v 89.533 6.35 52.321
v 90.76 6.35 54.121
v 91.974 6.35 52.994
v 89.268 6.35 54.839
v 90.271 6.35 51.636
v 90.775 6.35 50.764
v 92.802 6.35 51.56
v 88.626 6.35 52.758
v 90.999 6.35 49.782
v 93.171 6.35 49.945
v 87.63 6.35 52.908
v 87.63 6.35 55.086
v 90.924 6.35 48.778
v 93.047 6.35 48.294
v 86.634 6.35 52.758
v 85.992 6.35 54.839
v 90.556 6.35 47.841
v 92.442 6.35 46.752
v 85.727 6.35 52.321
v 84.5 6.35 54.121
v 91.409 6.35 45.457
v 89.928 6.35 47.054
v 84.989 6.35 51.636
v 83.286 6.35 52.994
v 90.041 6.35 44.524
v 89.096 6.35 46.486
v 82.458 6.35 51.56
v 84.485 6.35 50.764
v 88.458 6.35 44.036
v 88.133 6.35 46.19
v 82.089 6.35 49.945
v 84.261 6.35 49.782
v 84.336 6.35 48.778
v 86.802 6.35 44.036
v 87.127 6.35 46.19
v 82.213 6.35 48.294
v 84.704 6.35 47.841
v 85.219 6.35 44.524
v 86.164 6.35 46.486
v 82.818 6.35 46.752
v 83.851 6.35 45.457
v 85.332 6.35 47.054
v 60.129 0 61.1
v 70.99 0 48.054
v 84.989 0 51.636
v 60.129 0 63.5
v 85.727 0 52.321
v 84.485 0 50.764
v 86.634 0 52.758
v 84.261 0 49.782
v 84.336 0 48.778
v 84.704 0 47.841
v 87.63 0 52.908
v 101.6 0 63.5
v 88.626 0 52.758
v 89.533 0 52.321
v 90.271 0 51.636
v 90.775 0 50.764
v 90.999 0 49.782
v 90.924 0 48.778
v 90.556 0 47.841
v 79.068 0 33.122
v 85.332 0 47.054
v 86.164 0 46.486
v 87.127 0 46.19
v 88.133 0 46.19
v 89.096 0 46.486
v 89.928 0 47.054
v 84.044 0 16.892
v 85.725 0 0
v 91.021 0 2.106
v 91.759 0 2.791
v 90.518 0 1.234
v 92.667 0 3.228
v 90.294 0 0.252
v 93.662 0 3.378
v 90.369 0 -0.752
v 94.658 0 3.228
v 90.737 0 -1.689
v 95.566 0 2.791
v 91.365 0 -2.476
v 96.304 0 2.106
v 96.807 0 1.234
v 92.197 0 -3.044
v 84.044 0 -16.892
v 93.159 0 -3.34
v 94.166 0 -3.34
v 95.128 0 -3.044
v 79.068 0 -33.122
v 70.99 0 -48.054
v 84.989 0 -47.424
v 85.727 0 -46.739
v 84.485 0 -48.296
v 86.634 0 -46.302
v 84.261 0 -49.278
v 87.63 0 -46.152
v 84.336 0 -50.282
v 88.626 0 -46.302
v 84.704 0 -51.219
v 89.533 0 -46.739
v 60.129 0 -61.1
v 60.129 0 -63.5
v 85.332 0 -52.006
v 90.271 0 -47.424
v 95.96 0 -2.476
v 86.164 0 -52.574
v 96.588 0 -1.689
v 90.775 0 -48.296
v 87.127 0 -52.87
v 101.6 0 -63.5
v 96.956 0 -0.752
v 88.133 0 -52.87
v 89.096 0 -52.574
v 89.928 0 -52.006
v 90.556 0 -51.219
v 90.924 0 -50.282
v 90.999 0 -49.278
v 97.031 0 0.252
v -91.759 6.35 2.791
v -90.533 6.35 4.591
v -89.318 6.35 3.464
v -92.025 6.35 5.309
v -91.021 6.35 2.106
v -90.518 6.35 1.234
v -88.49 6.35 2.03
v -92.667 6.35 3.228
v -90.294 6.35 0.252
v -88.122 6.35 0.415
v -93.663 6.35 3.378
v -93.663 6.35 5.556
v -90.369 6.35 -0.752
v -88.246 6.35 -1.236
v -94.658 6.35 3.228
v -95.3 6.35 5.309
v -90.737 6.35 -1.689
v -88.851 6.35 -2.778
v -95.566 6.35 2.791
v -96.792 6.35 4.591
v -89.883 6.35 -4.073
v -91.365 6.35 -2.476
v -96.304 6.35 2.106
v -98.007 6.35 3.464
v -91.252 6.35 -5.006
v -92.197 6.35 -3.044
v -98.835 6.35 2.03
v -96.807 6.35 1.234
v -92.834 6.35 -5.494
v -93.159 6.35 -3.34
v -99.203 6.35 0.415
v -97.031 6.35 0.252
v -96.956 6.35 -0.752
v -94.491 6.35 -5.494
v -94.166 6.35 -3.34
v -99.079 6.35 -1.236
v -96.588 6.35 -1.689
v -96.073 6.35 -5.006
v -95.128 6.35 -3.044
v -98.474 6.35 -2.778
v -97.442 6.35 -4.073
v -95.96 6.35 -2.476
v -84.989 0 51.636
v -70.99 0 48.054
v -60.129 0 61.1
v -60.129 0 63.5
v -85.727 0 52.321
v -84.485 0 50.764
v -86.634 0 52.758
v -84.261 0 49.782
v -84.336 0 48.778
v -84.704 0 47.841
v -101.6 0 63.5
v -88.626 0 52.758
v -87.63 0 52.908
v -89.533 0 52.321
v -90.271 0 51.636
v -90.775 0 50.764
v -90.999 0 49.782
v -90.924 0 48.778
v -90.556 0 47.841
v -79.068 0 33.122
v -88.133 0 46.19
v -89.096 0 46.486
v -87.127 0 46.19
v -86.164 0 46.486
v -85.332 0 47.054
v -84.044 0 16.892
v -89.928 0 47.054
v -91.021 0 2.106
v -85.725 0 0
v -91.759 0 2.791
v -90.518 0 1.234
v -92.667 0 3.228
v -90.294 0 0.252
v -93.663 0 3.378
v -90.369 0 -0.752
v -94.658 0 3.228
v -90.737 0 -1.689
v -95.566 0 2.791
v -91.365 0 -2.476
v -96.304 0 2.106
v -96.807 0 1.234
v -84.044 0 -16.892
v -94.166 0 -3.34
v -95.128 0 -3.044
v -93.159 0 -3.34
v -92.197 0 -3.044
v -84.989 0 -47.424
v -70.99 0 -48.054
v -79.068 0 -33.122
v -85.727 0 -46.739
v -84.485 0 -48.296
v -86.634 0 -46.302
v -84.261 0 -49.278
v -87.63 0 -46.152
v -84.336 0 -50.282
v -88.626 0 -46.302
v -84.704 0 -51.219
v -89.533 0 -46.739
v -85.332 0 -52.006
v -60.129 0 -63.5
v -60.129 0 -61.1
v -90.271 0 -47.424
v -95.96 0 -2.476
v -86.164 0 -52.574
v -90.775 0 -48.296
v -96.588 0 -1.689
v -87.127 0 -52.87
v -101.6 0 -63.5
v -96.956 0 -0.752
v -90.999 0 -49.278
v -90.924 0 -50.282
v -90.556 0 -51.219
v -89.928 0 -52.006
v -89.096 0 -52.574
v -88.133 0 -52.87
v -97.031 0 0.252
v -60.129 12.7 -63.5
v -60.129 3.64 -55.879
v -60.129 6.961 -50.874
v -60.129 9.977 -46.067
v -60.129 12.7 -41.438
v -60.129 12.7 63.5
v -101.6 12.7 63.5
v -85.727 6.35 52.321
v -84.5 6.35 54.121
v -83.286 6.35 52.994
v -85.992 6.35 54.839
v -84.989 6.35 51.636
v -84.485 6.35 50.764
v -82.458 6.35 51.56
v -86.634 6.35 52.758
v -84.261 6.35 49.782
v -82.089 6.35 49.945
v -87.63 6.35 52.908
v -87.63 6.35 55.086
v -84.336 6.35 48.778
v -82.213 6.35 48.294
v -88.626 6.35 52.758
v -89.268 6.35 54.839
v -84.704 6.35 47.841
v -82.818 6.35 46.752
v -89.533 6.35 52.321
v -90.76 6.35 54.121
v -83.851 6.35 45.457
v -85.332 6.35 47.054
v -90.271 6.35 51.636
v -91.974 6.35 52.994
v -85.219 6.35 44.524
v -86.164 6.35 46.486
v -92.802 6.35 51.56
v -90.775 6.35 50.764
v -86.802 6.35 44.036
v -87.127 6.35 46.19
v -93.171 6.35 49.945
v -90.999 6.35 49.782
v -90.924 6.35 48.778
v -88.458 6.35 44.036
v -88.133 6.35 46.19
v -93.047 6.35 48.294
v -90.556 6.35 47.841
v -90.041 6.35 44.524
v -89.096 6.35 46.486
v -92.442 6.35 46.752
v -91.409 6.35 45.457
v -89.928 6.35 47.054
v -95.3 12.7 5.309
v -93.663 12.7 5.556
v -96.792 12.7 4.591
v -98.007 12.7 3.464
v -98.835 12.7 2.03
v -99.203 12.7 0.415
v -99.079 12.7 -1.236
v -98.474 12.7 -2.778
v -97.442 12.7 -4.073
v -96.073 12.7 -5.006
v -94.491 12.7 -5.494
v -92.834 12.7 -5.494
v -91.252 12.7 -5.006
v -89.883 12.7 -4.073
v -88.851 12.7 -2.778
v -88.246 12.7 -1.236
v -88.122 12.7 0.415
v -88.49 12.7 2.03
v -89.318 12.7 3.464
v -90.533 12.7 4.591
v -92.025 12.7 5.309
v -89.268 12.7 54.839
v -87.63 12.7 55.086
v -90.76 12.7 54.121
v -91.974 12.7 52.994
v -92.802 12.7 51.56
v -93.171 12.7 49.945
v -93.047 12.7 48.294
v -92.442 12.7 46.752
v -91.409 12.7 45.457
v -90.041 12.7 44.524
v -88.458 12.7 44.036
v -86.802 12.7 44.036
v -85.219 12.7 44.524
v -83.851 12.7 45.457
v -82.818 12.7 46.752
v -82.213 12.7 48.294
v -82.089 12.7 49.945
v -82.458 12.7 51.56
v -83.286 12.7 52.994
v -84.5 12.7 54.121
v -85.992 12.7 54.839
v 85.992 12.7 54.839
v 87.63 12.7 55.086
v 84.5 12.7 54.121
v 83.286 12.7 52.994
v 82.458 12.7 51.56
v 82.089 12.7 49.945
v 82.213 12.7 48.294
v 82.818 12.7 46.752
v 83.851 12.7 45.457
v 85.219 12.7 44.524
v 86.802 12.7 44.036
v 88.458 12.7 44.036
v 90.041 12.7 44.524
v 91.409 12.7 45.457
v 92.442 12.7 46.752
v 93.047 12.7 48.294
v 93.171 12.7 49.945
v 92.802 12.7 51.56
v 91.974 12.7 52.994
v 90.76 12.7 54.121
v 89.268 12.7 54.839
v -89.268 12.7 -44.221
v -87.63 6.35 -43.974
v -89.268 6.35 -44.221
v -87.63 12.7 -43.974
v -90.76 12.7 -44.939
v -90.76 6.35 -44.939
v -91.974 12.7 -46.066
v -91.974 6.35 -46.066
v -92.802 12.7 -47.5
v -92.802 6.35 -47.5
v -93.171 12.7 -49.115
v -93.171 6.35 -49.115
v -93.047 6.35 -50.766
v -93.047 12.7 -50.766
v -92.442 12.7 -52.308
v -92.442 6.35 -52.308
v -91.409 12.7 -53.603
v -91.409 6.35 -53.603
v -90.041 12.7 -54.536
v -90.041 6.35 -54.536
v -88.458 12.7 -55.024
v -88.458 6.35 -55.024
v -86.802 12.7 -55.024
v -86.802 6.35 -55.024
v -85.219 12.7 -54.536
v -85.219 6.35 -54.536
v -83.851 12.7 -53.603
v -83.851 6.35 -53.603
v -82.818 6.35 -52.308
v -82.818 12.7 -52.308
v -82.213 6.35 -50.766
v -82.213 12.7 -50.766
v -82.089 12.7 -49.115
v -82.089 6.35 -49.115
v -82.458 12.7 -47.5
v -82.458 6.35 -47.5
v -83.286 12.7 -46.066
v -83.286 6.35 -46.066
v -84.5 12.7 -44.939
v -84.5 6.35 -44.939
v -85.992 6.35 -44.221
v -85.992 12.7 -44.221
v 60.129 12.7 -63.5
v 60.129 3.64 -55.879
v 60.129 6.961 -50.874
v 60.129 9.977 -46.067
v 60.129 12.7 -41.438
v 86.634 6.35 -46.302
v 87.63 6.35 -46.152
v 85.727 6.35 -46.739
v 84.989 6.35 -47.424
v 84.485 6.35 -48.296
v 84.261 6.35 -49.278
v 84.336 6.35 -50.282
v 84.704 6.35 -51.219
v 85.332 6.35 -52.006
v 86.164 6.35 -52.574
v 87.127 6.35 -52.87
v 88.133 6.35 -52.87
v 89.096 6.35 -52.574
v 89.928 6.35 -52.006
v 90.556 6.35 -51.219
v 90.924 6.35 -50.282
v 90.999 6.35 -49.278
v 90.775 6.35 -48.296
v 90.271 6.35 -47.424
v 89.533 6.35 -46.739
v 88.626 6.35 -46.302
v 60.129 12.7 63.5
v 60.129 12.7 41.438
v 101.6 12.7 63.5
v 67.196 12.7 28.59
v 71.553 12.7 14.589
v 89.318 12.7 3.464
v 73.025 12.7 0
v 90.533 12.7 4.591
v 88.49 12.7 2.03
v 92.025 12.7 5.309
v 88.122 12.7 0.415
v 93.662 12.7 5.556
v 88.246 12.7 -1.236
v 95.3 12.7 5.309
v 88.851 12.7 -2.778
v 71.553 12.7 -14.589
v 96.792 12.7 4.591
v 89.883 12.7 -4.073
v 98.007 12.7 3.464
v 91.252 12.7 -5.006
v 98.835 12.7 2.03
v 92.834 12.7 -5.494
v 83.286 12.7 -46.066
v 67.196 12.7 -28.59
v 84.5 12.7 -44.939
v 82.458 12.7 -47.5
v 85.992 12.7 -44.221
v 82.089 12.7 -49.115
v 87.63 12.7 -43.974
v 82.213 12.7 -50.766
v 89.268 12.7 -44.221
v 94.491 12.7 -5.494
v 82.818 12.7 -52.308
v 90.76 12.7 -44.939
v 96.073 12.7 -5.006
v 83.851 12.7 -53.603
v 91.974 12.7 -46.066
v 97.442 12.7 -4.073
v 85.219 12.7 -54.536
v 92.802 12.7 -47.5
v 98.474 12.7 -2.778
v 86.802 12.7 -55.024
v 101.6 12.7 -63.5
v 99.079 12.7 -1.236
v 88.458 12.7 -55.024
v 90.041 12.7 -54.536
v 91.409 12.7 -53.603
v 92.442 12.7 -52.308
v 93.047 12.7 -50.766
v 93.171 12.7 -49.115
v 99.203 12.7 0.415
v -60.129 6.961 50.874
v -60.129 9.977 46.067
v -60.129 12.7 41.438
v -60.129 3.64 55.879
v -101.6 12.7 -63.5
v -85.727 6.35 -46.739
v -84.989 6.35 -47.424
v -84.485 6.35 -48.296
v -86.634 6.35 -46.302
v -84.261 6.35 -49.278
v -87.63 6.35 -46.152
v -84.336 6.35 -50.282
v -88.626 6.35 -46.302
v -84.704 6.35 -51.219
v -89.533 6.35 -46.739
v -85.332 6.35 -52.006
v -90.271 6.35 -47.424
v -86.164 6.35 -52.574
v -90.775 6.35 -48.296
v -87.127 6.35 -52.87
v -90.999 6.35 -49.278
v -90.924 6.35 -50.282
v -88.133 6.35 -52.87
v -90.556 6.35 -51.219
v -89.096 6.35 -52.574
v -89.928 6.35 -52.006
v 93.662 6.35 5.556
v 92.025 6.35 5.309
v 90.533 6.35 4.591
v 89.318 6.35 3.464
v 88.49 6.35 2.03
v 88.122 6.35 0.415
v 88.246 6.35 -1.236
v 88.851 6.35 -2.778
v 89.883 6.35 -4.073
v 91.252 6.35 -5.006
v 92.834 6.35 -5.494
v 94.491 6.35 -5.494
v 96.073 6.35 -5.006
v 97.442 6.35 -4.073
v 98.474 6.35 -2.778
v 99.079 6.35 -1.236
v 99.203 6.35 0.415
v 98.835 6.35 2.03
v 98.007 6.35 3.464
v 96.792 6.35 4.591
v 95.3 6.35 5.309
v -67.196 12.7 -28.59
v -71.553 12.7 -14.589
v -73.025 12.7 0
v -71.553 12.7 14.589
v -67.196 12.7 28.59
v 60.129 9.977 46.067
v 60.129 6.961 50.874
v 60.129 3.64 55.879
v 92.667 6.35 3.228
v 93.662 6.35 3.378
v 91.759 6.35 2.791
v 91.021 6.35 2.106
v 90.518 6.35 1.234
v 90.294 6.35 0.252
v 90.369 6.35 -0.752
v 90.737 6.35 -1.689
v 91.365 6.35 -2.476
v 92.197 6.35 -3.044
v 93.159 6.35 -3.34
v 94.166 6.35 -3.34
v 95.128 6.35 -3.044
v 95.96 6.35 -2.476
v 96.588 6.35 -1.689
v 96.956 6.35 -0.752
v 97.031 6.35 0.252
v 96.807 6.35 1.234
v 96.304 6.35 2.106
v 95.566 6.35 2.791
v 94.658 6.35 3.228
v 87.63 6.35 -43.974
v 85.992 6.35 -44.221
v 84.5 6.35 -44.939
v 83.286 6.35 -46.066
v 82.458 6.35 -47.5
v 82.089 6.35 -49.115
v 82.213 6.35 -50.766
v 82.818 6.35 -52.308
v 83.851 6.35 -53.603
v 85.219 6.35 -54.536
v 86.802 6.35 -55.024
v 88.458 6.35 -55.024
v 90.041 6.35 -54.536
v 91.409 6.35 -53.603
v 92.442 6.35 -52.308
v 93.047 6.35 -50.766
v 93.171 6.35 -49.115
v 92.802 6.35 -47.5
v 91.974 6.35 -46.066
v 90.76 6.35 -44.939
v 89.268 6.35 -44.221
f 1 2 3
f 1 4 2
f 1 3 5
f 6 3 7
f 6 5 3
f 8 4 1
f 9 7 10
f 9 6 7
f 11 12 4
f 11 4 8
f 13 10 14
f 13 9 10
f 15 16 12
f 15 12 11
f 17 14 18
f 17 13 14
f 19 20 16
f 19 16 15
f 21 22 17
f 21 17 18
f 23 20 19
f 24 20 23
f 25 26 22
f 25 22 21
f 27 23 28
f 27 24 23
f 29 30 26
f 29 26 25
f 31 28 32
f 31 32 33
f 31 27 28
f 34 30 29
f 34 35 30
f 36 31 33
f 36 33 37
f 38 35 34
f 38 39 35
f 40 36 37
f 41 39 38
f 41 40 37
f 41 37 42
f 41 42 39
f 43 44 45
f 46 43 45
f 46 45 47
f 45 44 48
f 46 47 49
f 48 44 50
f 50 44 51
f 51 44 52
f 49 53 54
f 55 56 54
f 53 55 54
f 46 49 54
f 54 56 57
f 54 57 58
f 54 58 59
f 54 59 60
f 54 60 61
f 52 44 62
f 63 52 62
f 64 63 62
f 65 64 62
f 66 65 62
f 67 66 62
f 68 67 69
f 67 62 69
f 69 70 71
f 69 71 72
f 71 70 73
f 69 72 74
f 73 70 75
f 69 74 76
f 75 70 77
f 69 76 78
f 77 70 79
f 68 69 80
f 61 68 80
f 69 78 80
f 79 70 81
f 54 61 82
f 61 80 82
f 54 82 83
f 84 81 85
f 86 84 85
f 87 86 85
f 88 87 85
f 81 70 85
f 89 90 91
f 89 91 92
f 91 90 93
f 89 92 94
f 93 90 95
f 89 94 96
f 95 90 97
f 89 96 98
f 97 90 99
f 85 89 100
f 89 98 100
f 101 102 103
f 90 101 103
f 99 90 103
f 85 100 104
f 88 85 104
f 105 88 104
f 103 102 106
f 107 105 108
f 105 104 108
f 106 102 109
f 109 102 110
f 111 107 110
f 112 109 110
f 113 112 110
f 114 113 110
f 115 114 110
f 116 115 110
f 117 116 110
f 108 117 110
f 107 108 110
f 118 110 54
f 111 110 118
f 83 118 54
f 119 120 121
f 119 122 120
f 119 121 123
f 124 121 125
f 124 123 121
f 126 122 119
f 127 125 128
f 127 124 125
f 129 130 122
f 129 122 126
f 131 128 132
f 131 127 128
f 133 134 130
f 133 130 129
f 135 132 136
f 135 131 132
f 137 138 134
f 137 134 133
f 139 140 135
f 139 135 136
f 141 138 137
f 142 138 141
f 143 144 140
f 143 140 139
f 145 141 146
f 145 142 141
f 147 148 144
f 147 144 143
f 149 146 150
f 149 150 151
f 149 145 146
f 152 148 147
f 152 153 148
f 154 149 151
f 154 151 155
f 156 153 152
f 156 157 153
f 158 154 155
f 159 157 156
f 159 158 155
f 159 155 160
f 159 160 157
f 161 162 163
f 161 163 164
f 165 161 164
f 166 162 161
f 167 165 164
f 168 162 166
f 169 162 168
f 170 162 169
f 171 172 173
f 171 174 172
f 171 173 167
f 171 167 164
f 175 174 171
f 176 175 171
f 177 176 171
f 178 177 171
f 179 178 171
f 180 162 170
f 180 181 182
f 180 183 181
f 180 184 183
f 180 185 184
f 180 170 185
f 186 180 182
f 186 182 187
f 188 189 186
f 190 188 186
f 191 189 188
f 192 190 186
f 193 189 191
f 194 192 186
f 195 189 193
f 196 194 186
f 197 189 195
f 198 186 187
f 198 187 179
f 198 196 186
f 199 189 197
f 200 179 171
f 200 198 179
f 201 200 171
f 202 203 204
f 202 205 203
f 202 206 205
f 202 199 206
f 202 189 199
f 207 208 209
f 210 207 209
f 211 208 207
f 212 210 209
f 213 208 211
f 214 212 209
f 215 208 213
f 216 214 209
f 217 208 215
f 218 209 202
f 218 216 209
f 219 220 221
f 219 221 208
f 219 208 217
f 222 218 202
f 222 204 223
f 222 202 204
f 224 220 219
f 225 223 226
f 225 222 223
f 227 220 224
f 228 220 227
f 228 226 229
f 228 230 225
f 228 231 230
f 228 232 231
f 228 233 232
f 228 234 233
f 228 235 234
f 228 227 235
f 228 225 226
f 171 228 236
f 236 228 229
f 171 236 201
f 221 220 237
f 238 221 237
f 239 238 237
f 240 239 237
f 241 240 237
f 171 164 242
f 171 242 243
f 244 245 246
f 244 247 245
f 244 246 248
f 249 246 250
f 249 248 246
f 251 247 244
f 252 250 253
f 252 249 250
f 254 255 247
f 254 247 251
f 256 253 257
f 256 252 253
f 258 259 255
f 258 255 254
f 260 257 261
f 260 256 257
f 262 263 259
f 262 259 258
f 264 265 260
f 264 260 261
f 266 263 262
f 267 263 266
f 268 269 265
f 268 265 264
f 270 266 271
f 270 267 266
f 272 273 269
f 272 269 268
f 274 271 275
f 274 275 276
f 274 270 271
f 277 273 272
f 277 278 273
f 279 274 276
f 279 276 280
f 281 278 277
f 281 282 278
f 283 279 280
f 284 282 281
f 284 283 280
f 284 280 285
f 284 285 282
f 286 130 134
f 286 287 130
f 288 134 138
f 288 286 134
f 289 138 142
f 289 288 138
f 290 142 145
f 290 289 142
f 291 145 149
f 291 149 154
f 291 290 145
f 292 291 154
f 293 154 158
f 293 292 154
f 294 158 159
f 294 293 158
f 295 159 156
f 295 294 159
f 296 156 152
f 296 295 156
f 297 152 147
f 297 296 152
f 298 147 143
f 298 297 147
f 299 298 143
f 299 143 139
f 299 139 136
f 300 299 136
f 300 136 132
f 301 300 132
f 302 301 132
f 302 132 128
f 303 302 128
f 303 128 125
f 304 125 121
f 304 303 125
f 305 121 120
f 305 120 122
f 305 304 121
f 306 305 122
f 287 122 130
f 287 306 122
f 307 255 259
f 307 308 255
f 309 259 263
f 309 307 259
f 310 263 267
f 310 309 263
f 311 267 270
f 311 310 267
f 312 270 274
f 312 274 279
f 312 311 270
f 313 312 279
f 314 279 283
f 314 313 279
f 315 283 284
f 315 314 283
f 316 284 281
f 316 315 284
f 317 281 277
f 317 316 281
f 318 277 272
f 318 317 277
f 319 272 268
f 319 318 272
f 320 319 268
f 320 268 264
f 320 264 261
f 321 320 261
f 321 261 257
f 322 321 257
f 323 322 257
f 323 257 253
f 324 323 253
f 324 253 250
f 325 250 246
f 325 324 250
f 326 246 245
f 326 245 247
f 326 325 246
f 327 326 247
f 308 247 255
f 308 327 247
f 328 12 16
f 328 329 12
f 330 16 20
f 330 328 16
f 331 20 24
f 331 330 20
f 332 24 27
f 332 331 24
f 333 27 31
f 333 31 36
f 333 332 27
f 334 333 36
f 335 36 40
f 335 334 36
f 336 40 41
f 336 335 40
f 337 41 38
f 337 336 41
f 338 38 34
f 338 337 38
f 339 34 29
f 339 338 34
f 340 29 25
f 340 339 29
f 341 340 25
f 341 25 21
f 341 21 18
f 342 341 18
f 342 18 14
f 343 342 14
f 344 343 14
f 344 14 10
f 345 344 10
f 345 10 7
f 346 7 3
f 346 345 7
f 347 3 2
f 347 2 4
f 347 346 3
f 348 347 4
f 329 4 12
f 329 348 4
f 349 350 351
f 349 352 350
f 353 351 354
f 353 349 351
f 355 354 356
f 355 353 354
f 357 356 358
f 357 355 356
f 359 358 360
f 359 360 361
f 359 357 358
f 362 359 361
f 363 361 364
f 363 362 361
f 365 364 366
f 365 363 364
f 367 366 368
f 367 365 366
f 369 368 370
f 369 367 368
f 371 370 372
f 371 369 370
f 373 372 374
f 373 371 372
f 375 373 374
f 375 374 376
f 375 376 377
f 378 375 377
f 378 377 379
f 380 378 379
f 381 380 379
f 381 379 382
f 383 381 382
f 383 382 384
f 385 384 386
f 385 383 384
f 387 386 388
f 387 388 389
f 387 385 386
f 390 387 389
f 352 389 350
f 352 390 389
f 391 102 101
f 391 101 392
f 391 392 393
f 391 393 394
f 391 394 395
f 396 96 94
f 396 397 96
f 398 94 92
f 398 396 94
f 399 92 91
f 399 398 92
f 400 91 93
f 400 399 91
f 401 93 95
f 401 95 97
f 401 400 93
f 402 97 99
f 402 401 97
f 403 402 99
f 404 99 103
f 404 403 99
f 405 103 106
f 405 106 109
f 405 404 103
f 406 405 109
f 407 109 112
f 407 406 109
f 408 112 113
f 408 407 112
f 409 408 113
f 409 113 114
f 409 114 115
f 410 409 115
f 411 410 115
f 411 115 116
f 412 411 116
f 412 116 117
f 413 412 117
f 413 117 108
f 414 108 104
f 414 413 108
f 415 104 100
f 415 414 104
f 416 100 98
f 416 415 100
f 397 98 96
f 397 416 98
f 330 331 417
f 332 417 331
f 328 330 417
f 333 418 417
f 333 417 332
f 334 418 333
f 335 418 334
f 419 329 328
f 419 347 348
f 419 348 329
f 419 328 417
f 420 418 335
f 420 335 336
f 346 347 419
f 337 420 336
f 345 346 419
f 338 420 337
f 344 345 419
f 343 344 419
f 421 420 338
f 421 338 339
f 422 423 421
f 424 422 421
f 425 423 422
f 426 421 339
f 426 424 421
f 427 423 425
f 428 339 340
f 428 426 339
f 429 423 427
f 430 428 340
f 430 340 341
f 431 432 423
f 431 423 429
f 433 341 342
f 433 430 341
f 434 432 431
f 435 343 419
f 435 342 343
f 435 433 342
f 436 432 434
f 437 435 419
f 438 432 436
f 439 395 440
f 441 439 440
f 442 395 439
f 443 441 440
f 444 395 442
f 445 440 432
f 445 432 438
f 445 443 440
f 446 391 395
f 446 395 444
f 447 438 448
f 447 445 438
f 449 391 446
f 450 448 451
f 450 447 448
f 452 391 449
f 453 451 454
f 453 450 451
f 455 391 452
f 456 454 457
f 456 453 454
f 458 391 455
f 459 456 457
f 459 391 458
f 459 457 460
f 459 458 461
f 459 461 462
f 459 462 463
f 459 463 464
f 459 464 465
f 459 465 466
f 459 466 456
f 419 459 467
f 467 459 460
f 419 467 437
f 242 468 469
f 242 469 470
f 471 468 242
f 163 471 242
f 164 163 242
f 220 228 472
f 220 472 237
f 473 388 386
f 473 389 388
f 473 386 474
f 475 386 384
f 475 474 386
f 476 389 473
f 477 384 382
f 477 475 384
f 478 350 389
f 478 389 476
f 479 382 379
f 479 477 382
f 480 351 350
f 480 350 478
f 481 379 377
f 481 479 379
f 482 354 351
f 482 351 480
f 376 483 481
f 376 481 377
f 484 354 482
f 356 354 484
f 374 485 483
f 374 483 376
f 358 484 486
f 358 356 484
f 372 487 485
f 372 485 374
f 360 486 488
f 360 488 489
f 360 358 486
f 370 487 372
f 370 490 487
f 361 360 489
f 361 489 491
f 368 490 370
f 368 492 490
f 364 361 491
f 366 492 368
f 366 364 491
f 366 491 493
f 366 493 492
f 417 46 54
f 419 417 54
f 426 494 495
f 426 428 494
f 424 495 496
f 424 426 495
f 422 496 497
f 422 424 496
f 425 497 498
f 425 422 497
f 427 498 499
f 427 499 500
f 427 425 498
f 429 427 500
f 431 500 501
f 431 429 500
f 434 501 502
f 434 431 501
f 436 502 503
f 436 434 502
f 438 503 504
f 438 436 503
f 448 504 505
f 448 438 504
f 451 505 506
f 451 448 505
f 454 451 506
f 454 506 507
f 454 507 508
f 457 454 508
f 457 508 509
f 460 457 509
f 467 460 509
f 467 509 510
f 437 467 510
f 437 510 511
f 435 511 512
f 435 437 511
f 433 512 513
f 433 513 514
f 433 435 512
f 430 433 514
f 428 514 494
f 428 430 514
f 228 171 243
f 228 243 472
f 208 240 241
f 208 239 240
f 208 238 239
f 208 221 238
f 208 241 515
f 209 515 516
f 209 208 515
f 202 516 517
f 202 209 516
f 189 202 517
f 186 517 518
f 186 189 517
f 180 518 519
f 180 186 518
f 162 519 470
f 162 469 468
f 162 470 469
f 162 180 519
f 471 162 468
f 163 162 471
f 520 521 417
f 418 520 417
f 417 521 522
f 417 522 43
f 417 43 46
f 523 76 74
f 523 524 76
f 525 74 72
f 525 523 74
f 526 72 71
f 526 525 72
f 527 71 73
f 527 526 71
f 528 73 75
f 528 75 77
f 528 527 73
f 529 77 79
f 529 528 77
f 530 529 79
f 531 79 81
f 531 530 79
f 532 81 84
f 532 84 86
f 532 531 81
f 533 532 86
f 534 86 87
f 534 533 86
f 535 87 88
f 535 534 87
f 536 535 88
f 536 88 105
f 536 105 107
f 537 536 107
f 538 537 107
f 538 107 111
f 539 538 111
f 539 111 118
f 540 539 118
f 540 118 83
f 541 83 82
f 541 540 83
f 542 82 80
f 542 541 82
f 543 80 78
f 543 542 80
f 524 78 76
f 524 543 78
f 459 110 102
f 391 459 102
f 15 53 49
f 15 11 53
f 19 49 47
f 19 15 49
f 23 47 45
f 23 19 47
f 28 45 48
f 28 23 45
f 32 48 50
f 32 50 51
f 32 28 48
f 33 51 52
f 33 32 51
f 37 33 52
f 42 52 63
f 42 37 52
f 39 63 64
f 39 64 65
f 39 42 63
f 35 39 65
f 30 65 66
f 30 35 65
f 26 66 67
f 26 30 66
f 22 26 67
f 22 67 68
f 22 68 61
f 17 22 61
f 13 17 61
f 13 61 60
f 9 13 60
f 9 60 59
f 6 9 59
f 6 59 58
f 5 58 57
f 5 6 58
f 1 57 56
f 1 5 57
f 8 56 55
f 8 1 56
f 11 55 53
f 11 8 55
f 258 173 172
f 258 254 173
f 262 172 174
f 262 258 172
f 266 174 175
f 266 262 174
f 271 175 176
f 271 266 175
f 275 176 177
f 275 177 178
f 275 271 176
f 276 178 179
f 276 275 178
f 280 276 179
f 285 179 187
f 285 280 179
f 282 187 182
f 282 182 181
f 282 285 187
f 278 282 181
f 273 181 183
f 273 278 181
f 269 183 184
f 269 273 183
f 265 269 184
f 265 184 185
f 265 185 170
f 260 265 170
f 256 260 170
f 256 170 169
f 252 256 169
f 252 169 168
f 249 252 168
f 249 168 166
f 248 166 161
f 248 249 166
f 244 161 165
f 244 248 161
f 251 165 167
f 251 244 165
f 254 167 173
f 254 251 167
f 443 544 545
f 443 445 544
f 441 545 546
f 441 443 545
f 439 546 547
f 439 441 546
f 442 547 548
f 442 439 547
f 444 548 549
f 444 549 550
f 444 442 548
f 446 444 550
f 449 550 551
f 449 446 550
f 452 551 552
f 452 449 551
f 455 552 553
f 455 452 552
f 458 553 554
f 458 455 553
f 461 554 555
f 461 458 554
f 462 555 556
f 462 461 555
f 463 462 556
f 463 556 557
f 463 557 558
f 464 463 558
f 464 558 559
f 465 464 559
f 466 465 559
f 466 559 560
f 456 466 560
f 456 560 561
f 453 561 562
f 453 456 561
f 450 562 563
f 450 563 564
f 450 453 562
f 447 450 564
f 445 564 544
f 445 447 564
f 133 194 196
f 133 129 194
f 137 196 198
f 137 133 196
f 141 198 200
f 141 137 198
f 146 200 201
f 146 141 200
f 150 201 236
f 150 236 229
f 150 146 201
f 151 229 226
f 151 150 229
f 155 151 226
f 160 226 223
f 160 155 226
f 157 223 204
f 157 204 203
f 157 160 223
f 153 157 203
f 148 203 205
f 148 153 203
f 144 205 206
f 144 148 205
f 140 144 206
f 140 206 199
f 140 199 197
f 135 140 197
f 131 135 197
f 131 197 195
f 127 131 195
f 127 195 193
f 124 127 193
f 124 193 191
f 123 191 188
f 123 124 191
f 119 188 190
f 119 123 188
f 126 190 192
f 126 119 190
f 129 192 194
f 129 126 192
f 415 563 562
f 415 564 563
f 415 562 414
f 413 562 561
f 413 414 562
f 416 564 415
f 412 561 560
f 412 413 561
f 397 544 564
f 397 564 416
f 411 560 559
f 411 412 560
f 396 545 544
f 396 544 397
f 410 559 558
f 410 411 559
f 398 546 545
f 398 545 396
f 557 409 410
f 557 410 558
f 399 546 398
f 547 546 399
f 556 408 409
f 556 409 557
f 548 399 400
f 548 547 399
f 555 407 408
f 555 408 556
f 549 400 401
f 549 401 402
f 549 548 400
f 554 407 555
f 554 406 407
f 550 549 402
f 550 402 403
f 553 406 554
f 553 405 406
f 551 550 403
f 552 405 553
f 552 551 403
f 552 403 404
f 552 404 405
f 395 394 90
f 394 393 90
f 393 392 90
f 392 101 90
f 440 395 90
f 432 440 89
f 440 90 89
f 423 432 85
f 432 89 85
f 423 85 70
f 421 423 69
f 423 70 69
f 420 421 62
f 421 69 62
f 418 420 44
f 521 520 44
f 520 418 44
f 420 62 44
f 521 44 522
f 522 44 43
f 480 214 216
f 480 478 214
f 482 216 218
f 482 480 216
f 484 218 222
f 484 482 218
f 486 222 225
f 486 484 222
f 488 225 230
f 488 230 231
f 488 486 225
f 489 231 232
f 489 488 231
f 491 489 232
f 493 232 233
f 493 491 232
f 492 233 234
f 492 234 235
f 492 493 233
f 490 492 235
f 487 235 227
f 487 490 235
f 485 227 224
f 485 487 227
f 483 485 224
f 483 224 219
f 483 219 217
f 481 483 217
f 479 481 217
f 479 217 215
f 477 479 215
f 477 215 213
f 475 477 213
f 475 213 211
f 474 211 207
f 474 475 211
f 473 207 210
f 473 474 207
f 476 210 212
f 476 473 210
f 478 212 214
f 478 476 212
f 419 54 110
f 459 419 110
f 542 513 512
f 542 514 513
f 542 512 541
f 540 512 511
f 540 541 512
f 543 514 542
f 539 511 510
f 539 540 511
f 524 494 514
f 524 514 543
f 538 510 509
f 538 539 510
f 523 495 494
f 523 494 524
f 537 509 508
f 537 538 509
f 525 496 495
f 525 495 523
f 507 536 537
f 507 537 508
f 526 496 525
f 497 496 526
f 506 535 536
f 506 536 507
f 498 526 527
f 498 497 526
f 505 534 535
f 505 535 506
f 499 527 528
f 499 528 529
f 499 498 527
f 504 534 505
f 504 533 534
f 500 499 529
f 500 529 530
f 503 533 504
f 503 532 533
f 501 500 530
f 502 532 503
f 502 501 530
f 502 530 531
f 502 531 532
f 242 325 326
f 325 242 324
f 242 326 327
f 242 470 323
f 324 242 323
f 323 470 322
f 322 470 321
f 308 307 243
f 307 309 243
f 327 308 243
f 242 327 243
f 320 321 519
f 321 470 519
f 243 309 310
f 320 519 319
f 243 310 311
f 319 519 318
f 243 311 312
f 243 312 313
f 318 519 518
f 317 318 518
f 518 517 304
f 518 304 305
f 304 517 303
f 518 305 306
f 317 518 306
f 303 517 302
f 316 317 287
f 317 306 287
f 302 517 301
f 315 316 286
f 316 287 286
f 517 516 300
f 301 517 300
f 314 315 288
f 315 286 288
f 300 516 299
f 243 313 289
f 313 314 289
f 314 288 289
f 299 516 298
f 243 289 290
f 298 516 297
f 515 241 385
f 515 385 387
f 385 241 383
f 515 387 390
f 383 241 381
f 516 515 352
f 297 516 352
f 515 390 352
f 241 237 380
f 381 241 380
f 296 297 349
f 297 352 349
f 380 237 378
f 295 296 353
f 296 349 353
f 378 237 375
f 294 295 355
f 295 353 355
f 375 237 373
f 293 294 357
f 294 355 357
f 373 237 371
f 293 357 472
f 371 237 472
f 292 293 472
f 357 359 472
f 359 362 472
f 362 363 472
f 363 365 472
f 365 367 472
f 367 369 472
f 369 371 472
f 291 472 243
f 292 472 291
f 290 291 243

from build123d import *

# Parameters (mm, degrees)
BOSS_EXTRUDE1_DEPTH                           = 12.7
BOSS_EXTRUDE1_2_DEPTH                         = 12.7
DRAFT1_ANGLE                                  = 45
DRAFT2_ANGLE                                  = 45
SKETCH2_W                                     = 120.258567884
SKETCH2_H                                     = 127
CUT_EXTRUDE1_DEPTH                            = 121.482778852
CBORE_FOR_1_4_SOCKET_HEAD_CAP_SCREW1_AT_COUNT = 2
CBORE_FOR_1_4_SOCKET_HEAD_CAP_SCREW1_AT_PITCH = 49.896011426
CBORE_FOR_1_4_SOCKET_HEAD_CAP_SCREW1_2_COUNT  = 2
CBORE_FOR_1_4_SOCKET_HEAD_CAP_SCREW1_2_PITCH  = 99.06
CBORE_FOR_1_4_SOCKET_HEAD_CAP_SCREW1_3_COUNT  = 2
CBORE_FOR_1_4_SOCKET_HEAD_CAP_SCREW1_3_PITCH  = 201.31803496
CBORE_FOR_1_4_SOCKET_HEAD_CAP_SCREW1_4_COUNT  = 2
CBORE_FOR_1_4_SOCKET_HEAD_CAP_SCREW1_4_PITCH  = 187.936668738
CBORE_FOR_1_4_SOCKET_HEAD_CAP_SCREW1_5_COUNT  = 2
CBORE_FOR_1_4_SOCKET_HEAD_CAP_SCREW1_5_PITCH  = 175.26


with BuildPart() as part:
    # Sketch1 → Boss-Extrude1 (new body)
    with BuildSketch(Plane(origin=(0, 0, 0), x_dir=(1, 0, 0), z_dir=(0, 1, 0))):
        with BuildLine():
            Line((-101.6, -63.5), (-101.6, 63.5))
            Line((-101.6, 63.5), (-57.589283942, 63.5))
            ThreePointArc((-57.589283942, 63.5), (-85.725, 0), (-57.589283942, -63.5))
            Line((-57.589283942, -63.5), (-101.6, -63.5))
        make_face()
    extrude(amount=BOSS_EXTRUDE1_DEPTH)

    # Draft2
    draft2_faces = [part.faces().sort_by_distance(p)[0] for p in [
        (-85.725, 6.35, 0),
    ]]
    draft(draft2_faces, Plane(origin=(0, 0, 0), x_dir=(0, 0, -1), z_dir=(0, -1, 0)), DRAFT2_ANGLE)


with BuildPart() as body_2:
    # Sketch1 → Boss-Extrude1 2 (new body)
    with BuildSketch(Plane(origin=(0, 0, 0), x_dir=(1, 0, 0), z_dir=(0, 1, 0))):
        with BuildLine():
            Line((101.6, -63.5), (101.6, 63.5))
            Line((101.6, 63.5), (57.589283942, 63.5))
            ThreePointArc((57.589283942, 63.5), (85.725, 0), (57.589283942, -63.5))
            Line((57.589283942, -63.5), (101.6, -63.5))
        make_face()
    extrude(amount=BOSS_EXTRUDE1_2_DEPTH)

    # Draft1
    draft1_faces = [body_2.faces().sort_by_distance(p)[0] for p in [
        (85.725, 6.35, 0),
    ]]
    draft(draft1_faces, Plane(origin=(0, 0, 0), x_dir=(0, 0, -1), z_dir=(0, -1, 0)), DRAFT1_ANGLE)


with BuildPart() as cut_extrude1_tool:
    # Sketch2 → Cut-Extrude1 (new, through all)
    with BuildSketch(Plane.XZ):
        Rectangle(SKETCH2_W, SKETCH2_H)
    extrude(amount=-CUT_EXTRUDE1_DEPTH)


with BuildPart() as part_1:
    add(part.part)

    # Cut-Extrude1: cut by cut_extrude1_tool
    add(cut_extrude1_tool.part, mode=Mode.SUBTRACT)


with BuildPart() as body_2_1:
    add(body_2.part)

    # Cut-Extrude1: cut by cut_extrude1_tool
    add(cut_extrude1_tool.part, mode=Mode.SUBTRACT)

    # Sketch4 → CBORE for 1/4 Socket Head Cap Screw1 (revolve, cut)
    with BuildSketch(Plane(origin=(87.63, 12.7, 49.53), x_dir=(0, 0, 1), z_dir=(1, 0, 0))):
        Polygon((0, 0), (0, 12.7), (3.3782, 12.7), (3.3782, 6.35), (5.55625, 6.35), (5.55625, 0), align=None)
    cbore_for_1_4_socket_head_cap_screw1 = revolve(axis=Axis((87.63, 19.05, 49.53), (0, -1, 0)), mode=Mode.SUBTRACT)

    # CBORE for 1/4 Socket Head Cap Screw1 at: CBORE for 1/4 Socket Head Cap Screw1 ×2
    with Locations(*[Vector(0.12090144738151404, 0, -0.9926645153429506) * (i * CBORE_FOR_1_4_SOCKET_HEAD_CAP_SCREW1_AT_PITCH) for i in range(1, CBORE_FOR_1_4_SOCKET_HEAD_CAP_SCREW1_AT_COUNT)]):
        add(cbore_for_1_4_socket_head_cap_screw1, mode=Mode.SUBTRACT)

    # CBORE for 1_4 Socket Head Cap Screw1 2: CBORE for 1/4 Socket Head Cap Screw1 ×2
    with Locations(*[(0, 0, -i * CBORE_FOR_1_4_SOCKET_HEAD_CAP_SCREW1_2_PITCH) for i in range(1, CBORE_FOR_1_4_SOCKET_HEAD_CAP_SCREW1_2_COUNT)]):
        add(cbore_for_1_4_socket_head_cap_screw1, mode=Mode.SUBTRACT)


with BuildPart() as part_2:
    add(part_1.part)

    # CBORE for 1_4 Socket Head Cap Screw1 3: CBORE for 1/4 Socket Head Cap Screw1 ×2
    with Locations(*[Vector(-0.8705628387201342, 0, -0.492057256667902) * (i * CBORE_FOR_1_4_SOCKET_HEAD_CAP_SCREW1_3_PITCH) for i in range(1, CBORE_FOR_1_4_SOCKET_HEAD_CAP_SCREW1_3_COUNT)]):
        add(cbore_for_1_4_socket_head_cap_screw1, mode=Mode.SUBTRACT)

    # CBORE for 1_4 Socket Head Cap Screw1 4: CBORE for 1/4 Socket Head Cap Screw1 ×2
    with Locations(*[Vector(-0.9646467675393356, 0, -0.2635462272086457) * (i * CBORE_FOR_1_4_SOCKET_HEAD_CAP_SCREW1_4_PITCH) for i in range(1, CBORE_FOR_1_4_SOCKET_HEAD_CAP_SCREW1_4_COUNT)]):
        add(cbore_for_1_4_socket_head_cap_screw1, mode=Mode.SUBTRACT)

    # CBORE for 1_4 Socket Head Cap Screw1 5: CBORE for 1/4 Socket Head Cap Screw1 ×2
    with Locations(*[(-i * CBORE_FOR_1_4_SOCKET_HEAD_CAP_SCREW1_5_PITCH, 0, 0) for i in range(1, CBORE_FOR_1_4_SOCKET_HEAD_CAP_SCREW1_5_COUNT)]):
        add(cbore_for_1_4_socket_head_cap_screw1, mode=Mode.SUBTRACT)


solid = Compound([body_2_1.part, part_2.part])
